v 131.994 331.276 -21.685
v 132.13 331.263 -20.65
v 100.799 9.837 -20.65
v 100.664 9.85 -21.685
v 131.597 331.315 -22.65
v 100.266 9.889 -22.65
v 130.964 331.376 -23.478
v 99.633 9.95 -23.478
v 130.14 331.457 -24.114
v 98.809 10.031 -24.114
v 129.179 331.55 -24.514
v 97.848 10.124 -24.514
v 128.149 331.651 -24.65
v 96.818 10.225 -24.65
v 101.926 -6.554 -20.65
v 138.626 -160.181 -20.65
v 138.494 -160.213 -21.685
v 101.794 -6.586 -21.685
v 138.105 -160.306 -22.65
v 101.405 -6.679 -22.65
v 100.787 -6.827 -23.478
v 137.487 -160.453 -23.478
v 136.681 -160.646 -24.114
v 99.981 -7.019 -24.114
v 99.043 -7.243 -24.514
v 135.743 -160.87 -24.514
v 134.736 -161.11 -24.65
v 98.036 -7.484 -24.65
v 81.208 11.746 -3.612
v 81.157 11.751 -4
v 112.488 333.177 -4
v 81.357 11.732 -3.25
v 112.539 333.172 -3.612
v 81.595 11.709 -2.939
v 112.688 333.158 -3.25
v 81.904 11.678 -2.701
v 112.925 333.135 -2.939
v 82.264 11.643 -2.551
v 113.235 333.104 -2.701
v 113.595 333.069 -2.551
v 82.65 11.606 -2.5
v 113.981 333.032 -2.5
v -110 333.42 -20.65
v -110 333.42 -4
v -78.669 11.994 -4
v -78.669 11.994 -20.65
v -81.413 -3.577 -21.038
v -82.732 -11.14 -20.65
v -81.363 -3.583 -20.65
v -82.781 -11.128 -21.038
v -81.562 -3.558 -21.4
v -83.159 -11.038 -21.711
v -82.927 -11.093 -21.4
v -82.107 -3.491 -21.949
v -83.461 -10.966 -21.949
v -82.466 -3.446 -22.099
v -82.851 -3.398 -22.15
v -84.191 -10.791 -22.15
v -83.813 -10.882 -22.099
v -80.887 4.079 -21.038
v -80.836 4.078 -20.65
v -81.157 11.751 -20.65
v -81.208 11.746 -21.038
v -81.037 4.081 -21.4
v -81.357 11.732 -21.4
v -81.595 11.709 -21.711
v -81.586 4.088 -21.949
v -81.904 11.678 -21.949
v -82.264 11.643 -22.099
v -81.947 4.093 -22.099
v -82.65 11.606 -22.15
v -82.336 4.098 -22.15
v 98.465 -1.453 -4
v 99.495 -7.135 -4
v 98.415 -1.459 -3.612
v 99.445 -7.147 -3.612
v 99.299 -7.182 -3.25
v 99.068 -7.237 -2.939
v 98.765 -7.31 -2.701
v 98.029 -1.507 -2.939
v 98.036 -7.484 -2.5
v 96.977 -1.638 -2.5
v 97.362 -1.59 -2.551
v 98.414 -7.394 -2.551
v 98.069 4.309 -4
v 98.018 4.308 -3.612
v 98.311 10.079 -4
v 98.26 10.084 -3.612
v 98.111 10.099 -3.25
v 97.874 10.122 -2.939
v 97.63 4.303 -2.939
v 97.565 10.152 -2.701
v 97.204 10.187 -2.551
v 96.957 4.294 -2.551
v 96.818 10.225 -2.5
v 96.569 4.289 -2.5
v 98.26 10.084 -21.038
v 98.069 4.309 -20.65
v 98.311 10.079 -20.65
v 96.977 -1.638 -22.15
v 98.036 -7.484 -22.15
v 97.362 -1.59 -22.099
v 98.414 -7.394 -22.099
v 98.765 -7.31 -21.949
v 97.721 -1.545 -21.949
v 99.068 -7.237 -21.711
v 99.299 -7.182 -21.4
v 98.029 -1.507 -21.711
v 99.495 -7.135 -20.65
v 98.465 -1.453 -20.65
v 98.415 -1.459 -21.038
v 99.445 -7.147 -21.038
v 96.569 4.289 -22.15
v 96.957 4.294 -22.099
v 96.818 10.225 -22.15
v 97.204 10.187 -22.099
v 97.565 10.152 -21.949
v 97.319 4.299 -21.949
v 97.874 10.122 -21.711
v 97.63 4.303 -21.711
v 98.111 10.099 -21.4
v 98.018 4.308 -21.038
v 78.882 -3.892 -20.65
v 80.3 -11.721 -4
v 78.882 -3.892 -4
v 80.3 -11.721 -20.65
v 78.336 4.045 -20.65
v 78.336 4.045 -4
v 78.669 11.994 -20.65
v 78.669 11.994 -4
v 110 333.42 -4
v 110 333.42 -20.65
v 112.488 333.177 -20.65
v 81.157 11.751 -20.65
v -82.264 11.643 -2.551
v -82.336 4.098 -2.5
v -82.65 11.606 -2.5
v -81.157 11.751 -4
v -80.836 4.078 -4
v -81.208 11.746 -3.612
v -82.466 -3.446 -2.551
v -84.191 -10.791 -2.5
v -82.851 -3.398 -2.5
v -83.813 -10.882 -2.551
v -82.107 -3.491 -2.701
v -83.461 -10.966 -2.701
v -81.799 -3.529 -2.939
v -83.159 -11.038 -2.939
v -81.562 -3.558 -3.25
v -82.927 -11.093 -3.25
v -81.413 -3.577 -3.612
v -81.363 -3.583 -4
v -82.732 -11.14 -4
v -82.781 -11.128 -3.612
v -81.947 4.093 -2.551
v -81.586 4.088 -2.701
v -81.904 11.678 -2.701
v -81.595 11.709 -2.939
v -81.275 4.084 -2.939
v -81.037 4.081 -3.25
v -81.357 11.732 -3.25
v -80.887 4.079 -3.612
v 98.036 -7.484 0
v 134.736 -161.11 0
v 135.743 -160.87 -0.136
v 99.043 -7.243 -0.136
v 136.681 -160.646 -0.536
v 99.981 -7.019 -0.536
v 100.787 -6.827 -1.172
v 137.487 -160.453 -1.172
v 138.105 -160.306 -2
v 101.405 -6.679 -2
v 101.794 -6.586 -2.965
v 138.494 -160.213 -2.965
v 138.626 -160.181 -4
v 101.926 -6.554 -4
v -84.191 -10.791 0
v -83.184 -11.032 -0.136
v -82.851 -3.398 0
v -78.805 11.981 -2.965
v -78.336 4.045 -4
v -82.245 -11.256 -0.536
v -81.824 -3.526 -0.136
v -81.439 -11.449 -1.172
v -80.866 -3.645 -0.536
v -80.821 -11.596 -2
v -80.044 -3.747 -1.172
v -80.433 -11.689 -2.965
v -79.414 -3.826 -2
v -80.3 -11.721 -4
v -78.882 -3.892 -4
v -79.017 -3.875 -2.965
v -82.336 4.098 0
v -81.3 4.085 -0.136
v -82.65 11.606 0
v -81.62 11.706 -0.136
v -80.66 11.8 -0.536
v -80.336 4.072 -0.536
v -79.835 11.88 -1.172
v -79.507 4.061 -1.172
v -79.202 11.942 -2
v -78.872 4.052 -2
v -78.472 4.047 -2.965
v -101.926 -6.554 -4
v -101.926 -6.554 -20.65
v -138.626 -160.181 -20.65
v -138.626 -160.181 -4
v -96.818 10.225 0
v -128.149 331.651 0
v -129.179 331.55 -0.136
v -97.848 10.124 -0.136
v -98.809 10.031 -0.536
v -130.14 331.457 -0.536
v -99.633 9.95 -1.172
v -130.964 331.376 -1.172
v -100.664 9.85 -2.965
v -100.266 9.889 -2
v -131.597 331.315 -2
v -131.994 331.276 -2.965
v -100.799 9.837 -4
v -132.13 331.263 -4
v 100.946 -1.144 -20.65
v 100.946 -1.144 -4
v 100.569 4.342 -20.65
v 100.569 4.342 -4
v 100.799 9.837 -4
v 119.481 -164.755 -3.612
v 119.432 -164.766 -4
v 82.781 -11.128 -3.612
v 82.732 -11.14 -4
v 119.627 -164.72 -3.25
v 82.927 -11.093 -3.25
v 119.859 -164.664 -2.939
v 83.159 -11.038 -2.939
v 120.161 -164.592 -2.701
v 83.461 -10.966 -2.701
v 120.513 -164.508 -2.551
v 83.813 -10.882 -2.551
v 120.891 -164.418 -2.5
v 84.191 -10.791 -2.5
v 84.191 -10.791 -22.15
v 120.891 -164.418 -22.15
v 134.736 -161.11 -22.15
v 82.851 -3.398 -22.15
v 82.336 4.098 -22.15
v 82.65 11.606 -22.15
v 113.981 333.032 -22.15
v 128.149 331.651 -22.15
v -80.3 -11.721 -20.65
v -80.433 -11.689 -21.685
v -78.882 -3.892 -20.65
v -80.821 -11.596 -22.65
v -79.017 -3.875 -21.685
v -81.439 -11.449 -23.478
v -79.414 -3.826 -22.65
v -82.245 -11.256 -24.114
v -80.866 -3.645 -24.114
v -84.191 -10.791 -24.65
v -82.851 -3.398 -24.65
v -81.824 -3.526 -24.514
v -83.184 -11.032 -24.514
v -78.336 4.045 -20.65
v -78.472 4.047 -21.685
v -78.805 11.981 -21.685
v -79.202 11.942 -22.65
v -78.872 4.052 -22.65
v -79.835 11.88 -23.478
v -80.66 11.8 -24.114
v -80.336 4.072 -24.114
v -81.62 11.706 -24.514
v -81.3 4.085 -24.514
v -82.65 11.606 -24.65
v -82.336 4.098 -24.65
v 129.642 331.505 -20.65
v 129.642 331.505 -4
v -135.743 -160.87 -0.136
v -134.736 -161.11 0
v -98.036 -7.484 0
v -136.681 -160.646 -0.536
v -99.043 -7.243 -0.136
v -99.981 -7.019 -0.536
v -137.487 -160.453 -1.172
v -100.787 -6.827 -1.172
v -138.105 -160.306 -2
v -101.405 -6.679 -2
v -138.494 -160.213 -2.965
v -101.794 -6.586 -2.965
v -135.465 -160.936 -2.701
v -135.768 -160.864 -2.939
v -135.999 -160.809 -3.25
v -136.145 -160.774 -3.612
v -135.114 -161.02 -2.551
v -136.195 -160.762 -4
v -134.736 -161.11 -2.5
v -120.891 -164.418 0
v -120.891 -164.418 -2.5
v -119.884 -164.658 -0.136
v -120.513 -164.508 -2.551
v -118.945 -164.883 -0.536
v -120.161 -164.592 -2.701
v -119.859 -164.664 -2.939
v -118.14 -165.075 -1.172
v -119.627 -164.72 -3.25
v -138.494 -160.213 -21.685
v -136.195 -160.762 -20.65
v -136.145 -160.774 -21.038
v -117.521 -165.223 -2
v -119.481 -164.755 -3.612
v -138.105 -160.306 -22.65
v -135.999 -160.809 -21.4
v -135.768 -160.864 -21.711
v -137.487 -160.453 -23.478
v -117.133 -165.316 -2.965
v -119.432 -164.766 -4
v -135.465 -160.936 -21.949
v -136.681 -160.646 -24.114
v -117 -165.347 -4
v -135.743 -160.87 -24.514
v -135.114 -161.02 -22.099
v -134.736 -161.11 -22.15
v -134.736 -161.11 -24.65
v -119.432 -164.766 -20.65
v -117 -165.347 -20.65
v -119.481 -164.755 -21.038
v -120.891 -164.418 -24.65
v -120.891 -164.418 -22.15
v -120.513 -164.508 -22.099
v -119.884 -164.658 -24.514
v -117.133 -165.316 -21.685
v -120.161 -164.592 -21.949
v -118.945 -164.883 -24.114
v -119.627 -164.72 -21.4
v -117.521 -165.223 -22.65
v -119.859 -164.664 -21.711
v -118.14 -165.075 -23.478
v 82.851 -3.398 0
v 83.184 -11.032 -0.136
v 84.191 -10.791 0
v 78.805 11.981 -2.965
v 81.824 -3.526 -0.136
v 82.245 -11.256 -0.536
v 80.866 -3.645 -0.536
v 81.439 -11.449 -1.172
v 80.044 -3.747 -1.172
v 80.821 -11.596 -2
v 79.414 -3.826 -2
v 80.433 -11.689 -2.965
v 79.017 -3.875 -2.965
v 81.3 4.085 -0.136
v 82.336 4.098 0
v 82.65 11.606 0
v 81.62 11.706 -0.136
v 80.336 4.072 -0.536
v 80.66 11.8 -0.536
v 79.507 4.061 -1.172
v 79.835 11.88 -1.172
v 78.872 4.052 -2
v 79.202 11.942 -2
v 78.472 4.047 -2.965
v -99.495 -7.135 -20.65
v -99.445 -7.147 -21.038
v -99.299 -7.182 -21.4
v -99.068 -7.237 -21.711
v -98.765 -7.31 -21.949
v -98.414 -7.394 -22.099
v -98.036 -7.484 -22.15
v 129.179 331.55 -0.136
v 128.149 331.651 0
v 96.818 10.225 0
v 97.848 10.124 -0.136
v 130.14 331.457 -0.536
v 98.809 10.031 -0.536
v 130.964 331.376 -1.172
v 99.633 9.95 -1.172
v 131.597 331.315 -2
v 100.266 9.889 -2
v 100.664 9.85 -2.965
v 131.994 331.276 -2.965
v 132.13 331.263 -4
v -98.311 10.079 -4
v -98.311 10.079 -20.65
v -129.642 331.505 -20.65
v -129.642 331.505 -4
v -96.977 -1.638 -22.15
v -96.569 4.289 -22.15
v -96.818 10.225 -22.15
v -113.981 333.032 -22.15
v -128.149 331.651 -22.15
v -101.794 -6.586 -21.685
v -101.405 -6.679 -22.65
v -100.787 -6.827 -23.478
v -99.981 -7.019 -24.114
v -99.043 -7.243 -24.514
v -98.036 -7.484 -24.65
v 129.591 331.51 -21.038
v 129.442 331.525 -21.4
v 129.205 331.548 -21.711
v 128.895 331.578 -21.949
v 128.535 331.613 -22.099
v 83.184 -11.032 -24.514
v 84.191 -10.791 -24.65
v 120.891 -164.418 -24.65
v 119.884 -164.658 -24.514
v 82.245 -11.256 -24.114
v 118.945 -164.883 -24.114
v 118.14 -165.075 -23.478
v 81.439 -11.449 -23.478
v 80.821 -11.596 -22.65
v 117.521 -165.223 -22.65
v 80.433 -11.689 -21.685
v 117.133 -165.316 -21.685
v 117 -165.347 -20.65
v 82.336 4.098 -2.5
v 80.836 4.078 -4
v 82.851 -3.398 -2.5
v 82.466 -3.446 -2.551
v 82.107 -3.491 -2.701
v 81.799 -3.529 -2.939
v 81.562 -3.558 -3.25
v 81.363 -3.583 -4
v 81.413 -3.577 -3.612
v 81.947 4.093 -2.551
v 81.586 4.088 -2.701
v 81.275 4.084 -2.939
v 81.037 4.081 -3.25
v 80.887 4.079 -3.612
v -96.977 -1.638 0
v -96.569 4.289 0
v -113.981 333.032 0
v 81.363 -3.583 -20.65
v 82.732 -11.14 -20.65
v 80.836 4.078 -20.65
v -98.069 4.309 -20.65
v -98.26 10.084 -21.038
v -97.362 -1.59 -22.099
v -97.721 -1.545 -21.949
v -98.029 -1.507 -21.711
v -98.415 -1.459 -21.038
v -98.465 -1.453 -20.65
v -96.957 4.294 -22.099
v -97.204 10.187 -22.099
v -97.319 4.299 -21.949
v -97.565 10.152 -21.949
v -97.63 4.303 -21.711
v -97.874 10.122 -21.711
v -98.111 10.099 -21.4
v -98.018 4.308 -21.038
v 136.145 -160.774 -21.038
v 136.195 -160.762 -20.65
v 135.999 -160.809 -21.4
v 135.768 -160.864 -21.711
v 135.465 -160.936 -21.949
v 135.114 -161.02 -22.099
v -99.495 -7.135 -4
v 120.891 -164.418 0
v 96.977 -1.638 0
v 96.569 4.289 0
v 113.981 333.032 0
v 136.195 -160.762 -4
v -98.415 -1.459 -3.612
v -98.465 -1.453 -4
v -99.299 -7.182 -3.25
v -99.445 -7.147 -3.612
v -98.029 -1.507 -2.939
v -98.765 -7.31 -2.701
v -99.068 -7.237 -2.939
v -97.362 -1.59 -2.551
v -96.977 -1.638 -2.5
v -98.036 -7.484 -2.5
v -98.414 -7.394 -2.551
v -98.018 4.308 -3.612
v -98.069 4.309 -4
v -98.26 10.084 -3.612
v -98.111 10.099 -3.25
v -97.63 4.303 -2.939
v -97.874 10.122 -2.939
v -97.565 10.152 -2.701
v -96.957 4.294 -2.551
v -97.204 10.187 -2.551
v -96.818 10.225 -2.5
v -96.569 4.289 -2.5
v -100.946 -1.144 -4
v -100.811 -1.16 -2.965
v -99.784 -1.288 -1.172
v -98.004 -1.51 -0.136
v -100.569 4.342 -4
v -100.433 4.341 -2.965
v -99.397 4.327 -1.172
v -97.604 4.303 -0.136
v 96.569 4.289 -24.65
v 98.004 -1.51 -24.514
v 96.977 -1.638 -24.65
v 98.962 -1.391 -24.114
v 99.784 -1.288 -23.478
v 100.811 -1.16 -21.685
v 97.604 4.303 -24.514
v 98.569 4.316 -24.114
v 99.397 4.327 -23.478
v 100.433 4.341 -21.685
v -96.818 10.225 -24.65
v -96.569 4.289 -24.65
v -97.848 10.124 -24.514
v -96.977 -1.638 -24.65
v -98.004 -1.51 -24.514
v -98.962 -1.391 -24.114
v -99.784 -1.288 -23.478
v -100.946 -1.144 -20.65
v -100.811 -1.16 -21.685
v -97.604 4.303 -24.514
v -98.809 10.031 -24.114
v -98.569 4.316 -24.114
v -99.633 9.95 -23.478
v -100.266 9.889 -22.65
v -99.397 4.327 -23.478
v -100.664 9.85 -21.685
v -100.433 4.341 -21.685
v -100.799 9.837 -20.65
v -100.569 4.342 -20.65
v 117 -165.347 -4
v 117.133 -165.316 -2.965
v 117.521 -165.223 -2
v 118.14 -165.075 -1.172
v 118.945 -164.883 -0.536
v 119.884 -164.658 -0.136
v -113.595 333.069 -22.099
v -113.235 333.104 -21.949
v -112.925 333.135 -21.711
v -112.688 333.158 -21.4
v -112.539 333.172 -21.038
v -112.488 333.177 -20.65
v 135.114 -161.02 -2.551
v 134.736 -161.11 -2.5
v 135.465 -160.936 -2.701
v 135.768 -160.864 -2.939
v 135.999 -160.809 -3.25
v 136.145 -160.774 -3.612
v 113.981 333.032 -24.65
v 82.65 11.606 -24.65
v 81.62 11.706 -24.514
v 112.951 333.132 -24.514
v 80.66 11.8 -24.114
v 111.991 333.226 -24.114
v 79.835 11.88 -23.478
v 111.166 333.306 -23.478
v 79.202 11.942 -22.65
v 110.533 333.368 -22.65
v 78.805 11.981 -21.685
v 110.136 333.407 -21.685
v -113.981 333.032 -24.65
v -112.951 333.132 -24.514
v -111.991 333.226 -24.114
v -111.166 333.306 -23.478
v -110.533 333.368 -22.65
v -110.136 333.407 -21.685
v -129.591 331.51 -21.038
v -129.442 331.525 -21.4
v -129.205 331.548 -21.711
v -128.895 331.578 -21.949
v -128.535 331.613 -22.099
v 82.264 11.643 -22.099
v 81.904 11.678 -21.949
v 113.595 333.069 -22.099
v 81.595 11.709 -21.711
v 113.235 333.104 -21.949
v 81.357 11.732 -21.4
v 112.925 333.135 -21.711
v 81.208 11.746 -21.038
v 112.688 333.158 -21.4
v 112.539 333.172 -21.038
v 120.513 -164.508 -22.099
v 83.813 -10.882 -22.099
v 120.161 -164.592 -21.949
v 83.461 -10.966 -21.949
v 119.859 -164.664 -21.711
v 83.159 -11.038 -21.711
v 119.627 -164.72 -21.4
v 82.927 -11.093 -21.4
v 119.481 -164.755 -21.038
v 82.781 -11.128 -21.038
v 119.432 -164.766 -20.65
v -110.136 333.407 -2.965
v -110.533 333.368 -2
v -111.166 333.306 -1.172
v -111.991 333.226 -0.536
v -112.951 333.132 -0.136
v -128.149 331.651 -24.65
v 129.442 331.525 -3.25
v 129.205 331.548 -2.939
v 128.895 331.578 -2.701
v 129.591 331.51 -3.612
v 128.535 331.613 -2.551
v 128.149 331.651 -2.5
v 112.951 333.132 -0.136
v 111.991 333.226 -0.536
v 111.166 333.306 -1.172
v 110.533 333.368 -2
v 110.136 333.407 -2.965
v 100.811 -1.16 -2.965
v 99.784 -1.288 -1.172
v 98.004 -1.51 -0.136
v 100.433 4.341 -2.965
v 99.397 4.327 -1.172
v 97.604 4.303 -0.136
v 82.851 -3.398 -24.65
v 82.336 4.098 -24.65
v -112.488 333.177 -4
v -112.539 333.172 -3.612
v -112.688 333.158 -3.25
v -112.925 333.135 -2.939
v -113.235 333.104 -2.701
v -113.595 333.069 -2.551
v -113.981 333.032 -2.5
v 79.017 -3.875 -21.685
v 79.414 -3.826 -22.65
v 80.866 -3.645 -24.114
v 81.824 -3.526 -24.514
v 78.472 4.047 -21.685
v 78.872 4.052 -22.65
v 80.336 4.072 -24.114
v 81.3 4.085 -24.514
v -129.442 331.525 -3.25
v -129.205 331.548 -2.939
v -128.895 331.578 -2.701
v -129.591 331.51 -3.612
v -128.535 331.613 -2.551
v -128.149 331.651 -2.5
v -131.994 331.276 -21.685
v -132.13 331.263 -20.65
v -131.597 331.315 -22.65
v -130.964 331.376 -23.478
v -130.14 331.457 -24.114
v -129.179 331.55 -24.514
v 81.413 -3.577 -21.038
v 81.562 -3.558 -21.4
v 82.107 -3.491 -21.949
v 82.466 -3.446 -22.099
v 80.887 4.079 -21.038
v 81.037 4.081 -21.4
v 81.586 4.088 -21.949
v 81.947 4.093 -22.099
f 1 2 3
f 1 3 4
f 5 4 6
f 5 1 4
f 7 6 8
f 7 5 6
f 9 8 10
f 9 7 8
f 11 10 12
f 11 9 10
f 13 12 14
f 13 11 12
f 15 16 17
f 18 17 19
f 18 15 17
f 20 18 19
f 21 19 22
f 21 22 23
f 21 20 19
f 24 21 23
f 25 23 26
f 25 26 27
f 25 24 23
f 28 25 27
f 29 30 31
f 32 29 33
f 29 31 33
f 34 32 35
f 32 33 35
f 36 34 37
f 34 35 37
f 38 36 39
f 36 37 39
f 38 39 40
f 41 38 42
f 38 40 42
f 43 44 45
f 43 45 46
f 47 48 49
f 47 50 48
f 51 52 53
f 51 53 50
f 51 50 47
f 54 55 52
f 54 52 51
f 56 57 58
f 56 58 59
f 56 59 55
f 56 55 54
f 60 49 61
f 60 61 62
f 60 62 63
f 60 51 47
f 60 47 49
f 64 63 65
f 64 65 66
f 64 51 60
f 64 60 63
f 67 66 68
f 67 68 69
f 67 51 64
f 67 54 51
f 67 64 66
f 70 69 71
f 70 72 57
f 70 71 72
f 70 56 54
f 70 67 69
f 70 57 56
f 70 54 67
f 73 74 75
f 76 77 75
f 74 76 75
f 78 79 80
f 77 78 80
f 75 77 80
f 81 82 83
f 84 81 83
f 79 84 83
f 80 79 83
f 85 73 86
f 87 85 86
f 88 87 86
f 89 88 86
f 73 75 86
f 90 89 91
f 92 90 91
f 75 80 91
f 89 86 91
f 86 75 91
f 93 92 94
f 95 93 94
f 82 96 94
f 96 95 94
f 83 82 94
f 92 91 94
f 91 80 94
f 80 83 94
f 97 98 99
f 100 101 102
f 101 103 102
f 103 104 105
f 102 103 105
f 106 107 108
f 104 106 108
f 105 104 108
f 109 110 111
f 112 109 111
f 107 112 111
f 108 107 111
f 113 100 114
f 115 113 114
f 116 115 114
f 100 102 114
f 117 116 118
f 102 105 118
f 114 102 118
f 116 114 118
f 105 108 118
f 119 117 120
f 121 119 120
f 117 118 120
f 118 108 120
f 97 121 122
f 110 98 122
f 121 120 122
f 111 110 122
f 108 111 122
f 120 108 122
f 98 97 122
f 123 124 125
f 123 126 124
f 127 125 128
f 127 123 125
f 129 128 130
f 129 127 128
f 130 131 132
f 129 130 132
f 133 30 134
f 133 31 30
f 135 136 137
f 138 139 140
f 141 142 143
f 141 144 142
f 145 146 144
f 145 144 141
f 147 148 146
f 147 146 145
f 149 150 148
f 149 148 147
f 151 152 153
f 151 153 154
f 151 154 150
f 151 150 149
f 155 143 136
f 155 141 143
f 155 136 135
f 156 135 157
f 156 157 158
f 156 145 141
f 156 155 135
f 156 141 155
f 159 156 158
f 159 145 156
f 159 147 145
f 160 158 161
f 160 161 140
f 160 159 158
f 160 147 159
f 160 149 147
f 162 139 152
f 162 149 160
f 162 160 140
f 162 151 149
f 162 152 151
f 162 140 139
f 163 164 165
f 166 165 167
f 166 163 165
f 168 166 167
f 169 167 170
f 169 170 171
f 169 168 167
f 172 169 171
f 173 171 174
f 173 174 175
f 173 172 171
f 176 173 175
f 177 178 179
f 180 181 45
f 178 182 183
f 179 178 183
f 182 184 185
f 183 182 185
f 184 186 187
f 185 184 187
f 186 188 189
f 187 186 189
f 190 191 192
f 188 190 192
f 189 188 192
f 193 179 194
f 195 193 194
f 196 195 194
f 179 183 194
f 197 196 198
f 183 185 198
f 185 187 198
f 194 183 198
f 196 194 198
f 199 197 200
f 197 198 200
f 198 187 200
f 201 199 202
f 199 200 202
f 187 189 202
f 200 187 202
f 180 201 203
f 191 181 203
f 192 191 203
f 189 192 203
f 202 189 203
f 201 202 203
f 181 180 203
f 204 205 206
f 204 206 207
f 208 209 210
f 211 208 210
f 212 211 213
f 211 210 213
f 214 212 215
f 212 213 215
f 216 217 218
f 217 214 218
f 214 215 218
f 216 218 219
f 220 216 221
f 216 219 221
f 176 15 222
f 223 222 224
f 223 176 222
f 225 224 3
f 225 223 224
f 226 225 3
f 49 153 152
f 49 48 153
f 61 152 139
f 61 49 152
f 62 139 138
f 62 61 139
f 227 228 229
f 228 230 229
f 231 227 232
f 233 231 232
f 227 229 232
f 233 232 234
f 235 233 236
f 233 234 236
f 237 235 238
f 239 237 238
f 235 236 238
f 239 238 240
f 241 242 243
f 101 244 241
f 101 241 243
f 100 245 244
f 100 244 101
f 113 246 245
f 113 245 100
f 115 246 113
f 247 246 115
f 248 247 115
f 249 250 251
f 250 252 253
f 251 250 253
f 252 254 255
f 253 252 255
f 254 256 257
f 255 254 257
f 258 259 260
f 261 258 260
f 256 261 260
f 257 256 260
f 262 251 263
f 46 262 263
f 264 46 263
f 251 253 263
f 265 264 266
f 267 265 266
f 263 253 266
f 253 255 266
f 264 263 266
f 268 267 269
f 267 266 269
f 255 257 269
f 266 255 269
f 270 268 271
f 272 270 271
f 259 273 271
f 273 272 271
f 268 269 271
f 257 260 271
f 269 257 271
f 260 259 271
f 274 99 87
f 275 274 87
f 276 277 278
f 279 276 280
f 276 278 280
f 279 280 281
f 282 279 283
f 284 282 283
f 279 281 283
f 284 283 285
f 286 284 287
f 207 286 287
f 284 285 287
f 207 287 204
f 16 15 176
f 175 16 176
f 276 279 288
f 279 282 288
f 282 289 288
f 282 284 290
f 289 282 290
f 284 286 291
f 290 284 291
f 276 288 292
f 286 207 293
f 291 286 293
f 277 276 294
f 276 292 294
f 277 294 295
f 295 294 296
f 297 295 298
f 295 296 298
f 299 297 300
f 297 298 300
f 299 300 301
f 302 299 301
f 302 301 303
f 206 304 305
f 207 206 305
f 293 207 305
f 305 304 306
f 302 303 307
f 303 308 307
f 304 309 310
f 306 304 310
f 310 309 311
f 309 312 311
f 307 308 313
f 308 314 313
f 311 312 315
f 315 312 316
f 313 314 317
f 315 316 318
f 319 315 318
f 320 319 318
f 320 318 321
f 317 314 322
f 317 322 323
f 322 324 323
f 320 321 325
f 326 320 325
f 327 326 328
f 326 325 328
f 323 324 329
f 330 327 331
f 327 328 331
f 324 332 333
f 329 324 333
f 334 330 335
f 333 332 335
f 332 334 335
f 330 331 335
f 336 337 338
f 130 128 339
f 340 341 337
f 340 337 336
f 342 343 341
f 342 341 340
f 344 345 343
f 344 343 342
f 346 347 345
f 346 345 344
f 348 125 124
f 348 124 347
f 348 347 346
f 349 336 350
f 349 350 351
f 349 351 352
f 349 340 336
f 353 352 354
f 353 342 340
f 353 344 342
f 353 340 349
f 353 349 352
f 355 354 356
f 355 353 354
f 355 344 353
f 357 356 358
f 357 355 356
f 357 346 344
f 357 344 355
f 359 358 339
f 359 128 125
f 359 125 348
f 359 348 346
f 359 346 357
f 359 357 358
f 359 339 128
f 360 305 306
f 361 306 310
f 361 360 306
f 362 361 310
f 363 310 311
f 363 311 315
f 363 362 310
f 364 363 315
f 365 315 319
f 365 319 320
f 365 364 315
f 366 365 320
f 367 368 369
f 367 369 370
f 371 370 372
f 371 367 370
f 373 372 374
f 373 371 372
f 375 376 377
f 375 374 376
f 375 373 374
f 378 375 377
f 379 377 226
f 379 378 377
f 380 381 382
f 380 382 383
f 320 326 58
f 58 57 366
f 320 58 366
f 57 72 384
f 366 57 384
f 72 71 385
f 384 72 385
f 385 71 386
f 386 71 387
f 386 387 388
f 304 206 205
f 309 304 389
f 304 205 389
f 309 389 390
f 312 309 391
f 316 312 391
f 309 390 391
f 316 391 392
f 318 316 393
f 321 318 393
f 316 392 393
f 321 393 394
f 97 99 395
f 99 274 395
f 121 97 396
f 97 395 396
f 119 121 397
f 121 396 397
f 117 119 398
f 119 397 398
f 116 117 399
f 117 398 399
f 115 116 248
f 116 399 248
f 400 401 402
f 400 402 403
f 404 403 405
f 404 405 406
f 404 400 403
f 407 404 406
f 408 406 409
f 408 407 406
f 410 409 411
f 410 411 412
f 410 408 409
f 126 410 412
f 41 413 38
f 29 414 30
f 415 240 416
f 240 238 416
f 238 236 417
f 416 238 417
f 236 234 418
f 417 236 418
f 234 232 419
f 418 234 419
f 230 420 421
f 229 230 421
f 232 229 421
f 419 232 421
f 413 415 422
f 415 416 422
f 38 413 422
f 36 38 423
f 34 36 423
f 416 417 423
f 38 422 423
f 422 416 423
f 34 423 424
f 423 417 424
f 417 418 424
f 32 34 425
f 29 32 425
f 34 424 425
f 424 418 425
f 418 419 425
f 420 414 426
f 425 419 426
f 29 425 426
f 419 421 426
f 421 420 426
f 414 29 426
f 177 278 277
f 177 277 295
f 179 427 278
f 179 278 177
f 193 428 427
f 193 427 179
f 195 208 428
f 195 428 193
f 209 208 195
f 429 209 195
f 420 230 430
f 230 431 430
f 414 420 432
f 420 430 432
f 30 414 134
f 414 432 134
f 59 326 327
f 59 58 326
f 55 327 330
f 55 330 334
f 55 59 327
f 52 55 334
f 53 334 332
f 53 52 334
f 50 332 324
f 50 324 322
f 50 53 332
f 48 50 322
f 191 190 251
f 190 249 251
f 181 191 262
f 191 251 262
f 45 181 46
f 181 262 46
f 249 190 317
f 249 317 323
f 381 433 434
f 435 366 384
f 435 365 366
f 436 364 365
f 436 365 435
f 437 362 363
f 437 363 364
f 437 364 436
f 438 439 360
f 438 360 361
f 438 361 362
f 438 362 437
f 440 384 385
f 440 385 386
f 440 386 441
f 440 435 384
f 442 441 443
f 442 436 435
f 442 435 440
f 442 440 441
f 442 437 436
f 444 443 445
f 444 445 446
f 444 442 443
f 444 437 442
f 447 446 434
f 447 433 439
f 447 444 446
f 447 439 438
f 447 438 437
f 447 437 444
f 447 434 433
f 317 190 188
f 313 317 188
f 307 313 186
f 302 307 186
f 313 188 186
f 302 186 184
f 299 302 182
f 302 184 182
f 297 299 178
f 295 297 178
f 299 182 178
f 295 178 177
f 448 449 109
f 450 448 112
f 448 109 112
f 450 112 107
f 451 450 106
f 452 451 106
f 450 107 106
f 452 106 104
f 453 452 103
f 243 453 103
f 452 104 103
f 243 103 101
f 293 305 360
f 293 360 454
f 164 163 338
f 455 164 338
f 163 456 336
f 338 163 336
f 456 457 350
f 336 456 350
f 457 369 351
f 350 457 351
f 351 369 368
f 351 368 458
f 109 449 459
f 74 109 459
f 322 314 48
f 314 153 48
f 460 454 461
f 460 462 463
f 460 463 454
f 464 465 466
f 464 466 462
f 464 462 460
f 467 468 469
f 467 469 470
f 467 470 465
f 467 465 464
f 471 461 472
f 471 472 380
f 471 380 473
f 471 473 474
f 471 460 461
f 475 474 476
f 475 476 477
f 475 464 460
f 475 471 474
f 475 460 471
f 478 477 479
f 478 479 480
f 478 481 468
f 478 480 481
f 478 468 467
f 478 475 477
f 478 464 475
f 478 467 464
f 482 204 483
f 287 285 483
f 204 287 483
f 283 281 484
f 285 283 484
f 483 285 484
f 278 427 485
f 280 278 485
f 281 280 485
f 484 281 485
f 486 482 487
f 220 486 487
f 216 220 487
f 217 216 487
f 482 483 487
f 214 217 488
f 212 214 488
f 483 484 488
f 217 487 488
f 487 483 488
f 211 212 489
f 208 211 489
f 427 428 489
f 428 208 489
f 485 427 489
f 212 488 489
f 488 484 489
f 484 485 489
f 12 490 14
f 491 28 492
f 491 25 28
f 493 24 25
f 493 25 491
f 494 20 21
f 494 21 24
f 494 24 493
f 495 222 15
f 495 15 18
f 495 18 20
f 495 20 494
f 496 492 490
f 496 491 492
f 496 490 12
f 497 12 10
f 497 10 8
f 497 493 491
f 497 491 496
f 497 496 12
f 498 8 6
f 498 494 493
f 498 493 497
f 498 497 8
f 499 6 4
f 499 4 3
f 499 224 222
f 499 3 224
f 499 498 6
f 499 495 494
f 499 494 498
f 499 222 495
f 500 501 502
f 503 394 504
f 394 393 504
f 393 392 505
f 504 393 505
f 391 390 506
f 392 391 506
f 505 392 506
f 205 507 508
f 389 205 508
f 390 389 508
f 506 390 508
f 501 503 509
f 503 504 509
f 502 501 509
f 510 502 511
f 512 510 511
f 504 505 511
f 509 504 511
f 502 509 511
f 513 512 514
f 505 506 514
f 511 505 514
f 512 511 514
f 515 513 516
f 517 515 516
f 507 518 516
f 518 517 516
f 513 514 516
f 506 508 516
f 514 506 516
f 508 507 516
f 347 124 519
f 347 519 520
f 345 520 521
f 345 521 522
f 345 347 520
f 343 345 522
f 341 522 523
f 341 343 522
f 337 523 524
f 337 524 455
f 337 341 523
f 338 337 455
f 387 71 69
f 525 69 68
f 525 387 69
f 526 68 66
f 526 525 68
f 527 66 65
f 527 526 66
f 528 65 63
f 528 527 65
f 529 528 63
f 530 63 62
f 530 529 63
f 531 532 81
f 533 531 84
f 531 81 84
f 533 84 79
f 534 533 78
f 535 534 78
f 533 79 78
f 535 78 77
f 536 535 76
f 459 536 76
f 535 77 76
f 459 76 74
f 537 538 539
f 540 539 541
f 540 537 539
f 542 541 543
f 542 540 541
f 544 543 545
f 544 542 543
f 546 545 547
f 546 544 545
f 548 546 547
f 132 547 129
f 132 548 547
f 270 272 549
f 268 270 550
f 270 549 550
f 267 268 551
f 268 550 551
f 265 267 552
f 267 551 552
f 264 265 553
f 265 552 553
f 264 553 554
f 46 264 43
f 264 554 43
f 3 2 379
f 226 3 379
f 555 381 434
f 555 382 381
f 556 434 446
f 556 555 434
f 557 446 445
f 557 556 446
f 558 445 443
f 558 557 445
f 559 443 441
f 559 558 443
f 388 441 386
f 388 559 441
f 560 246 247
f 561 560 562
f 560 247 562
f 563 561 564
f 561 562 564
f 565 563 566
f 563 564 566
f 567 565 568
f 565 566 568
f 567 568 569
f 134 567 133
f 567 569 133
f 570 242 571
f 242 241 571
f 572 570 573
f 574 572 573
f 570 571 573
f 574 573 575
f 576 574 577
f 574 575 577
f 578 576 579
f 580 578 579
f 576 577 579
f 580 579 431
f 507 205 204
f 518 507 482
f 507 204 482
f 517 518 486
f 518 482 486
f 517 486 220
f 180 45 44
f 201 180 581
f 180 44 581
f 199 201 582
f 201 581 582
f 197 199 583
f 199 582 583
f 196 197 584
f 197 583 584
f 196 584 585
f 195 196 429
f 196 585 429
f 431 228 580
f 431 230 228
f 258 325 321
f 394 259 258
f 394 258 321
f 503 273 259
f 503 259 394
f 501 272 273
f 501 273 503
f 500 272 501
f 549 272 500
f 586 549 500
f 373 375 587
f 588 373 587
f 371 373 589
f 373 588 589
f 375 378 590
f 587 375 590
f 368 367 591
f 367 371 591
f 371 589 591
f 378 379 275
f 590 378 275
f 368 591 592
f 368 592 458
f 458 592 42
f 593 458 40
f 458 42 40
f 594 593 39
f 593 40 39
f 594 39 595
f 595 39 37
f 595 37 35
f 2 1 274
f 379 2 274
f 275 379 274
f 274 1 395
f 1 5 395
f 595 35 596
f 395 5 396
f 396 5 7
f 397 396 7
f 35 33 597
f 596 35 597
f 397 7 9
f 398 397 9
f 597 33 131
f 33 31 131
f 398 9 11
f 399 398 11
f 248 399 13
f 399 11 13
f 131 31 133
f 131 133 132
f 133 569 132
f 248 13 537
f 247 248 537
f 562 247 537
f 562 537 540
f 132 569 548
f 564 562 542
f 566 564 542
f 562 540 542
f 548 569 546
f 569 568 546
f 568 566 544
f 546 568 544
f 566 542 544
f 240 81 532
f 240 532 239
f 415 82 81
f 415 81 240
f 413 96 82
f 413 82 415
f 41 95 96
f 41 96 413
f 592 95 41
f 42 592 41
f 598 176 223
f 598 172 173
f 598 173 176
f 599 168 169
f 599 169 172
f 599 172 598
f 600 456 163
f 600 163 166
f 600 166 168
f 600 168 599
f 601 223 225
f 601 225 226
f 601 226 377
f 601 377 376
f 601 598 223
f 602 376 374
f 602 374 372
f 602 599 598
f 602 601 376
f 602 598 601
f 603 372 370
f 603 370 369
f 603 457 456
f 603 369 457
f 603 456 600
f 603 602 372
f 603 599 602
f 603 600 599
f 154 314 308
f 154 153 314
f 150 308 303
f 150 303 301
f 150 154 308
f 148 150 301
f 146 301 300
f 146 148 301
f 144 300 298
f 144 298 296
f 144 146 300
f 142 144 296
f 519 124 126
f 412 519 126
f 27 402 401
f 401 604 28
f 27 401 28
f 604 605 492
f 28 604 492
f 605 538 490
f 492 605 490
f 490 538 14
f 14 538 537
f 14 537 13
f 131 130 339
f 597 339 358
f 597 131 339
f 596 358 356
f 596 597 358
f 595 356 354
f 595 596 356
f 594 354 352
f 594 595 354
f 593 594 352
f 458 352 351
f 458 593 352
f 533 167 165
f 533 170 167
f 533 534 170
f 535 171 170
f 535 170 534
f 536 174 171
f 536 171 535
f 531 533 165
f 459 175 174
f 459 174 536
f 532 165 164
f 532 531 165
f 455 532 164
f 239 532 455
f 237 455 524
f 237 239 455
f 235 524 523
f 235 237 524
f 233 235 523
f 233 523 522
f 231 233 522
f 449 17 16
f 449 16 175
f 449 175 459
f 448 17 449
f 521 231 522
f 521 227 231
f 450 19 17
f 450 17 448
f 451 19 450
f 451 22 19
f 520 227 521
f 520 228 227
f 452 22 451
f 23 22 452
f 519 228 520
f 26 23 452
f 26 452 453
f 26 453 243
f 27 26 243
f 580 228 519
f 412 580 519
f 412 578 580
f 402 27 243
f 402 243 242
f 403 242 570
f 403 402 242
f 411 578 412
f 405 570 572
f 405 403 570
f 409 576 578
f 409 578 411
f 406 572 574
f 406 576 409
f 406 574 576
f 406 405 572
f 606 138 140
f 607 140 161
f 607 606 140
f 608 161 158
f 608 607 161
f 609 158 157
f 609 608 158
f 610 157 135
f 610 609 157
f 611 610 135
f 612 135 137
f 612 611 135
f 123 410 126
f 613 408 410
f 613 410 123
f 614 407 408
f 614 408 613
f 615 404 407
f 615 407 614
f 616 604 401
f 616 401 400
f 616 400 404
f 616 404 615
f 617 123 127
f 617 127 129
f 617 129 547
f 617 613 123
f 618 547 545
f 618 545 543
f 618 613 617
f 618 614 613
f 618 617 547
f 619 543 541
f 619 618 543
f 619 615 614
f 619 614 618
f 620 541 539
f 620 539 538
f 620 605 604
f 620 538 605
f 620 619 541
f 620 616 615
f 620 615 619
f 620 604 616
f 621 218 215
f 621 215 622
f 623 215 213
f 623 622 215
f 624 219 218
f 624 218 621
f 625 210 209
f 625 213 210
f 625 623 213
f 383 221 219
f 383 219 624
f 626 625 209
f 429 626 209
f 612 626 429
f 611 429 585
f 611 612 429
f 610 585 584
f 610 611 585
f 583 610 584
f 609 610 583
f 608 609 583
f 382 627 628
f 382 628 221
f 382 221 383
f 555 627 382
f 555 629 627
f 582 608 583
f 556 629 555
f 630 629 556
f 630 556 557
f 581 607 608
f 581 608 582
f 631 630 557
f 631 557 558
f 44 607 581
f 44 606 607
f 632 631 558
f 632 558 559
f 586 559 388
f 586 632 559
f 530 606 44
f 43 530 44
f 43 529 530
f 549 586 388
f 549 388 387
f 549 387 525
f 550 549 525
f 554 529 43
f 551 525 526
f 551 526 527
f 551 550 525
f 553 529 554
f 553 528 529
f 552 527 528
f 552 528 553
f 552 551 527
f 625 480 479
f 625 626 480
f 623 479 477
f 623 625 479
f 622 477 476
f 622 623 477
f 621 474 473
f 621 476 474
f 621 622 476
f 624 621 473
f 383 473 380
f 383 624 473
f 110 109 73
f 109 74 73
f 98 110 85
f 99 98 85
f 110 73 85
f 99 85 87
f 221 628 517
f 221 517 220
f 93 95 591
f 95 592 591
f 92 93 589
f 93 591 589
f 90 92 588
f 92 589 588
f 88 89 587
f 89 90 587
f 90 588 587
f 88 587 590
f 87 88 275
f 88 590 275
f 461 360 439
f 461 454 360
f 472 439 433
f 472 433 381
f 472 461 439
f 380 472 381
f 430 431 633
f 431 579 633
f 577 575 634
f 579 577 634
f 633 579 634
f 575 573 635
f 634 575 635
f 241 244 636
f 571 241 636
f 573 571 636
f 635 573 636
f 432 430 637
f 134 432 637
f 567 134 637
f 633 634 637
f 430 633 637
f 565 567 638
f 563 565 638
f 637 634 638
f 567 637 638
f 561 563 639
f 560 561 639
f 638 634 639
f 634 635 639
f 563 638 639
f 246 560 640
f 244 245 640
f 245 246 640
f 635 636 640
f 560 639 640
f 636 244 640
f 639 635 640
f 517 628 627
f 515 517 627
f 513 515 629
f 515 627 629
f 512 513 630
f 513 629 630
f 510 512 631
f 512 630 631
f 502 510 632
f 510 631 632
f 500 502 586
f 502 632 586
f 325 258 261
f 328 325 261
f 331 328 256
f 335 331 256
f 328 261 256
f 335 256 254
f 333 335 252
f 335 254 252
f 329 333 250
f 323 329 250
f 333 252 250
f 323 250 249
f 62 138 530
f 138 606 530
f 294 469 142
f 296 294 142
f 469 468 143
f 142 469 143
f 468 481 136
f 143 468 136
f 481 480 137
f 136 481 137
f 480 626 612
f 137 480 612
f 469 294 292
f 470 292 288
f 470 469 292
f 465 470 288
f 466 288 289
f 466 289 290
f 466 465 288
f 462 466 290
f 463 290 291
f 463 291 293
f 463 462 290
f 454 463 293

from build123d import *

# Parameters (mm, degrees)
F4_T = -2.5


with BuildPart() as f3:
    # F3: sweep along a path in F0
    with BuildLine(Plane.XY) as f3_path:
        Line((117, -165.347361636), (80.2999848354, -11.7207621559))
        ThreePointArc((80.2999848354, -11.7207621559), (78.4991207254, 0.0687118362), (78.6690849209, 11.9937242357))
        Line((78.6690849209, 11.9937242357), (110, 333.419780457))
    # F2 (on line) → F3 (sweep)
    with BuildSketch(Plane(origin=(43.6840614187, -182.8618810412, 0), x_dir=(0.972631539, 0.2323529412, 0), z_dir=(0.2323529412, -0.972631539, 0))):
        with BuildLine():
            Line((93.6139442753, 0), (79.3789442753, 0))
            ThreePointArc((79.3789442753, 0), (76.5505171505, -1.1715728753), (75.3789442753, -4))
            Line((75.3789442753, -4), (75.3789442753, -20.65))
            ThreePointArc((75.3789442753, -20.65), (76.5505171505, -23.4784271247), (79.3789442753, -24.65))
            Line((79.3789442753, -24.65), (93.6139442753, -24.65))
            ThreePointArc((93.6139442753, -24.65), (96.4423714, -23.4784271247), (97.6139442753, -20.65))
            Line((97.6139442753, -20.65), (97.6139442753, -4))
            ThreePointArc((97.6139442753, -4), (96.4423714, -1.1715728753), (93.6139442753, 0))
        make_face()
    sweep(path=f3_path.line)

    # F4
    f4_openings = [f3.faces().sort_by_distance(p)[0] for p in [
        (127.813231, -162.764178, -12.325),
        (121.065058, 332.341217, -12.325),
    ]]
    offset(amount=F4_T, openings=f4_openings)


with BuildPart() as f8_1:
    # F8: instance of F3
    add(f3.part.mirror(Plane.YZ))


solid = Compound([f3.part, f8_1.part])
